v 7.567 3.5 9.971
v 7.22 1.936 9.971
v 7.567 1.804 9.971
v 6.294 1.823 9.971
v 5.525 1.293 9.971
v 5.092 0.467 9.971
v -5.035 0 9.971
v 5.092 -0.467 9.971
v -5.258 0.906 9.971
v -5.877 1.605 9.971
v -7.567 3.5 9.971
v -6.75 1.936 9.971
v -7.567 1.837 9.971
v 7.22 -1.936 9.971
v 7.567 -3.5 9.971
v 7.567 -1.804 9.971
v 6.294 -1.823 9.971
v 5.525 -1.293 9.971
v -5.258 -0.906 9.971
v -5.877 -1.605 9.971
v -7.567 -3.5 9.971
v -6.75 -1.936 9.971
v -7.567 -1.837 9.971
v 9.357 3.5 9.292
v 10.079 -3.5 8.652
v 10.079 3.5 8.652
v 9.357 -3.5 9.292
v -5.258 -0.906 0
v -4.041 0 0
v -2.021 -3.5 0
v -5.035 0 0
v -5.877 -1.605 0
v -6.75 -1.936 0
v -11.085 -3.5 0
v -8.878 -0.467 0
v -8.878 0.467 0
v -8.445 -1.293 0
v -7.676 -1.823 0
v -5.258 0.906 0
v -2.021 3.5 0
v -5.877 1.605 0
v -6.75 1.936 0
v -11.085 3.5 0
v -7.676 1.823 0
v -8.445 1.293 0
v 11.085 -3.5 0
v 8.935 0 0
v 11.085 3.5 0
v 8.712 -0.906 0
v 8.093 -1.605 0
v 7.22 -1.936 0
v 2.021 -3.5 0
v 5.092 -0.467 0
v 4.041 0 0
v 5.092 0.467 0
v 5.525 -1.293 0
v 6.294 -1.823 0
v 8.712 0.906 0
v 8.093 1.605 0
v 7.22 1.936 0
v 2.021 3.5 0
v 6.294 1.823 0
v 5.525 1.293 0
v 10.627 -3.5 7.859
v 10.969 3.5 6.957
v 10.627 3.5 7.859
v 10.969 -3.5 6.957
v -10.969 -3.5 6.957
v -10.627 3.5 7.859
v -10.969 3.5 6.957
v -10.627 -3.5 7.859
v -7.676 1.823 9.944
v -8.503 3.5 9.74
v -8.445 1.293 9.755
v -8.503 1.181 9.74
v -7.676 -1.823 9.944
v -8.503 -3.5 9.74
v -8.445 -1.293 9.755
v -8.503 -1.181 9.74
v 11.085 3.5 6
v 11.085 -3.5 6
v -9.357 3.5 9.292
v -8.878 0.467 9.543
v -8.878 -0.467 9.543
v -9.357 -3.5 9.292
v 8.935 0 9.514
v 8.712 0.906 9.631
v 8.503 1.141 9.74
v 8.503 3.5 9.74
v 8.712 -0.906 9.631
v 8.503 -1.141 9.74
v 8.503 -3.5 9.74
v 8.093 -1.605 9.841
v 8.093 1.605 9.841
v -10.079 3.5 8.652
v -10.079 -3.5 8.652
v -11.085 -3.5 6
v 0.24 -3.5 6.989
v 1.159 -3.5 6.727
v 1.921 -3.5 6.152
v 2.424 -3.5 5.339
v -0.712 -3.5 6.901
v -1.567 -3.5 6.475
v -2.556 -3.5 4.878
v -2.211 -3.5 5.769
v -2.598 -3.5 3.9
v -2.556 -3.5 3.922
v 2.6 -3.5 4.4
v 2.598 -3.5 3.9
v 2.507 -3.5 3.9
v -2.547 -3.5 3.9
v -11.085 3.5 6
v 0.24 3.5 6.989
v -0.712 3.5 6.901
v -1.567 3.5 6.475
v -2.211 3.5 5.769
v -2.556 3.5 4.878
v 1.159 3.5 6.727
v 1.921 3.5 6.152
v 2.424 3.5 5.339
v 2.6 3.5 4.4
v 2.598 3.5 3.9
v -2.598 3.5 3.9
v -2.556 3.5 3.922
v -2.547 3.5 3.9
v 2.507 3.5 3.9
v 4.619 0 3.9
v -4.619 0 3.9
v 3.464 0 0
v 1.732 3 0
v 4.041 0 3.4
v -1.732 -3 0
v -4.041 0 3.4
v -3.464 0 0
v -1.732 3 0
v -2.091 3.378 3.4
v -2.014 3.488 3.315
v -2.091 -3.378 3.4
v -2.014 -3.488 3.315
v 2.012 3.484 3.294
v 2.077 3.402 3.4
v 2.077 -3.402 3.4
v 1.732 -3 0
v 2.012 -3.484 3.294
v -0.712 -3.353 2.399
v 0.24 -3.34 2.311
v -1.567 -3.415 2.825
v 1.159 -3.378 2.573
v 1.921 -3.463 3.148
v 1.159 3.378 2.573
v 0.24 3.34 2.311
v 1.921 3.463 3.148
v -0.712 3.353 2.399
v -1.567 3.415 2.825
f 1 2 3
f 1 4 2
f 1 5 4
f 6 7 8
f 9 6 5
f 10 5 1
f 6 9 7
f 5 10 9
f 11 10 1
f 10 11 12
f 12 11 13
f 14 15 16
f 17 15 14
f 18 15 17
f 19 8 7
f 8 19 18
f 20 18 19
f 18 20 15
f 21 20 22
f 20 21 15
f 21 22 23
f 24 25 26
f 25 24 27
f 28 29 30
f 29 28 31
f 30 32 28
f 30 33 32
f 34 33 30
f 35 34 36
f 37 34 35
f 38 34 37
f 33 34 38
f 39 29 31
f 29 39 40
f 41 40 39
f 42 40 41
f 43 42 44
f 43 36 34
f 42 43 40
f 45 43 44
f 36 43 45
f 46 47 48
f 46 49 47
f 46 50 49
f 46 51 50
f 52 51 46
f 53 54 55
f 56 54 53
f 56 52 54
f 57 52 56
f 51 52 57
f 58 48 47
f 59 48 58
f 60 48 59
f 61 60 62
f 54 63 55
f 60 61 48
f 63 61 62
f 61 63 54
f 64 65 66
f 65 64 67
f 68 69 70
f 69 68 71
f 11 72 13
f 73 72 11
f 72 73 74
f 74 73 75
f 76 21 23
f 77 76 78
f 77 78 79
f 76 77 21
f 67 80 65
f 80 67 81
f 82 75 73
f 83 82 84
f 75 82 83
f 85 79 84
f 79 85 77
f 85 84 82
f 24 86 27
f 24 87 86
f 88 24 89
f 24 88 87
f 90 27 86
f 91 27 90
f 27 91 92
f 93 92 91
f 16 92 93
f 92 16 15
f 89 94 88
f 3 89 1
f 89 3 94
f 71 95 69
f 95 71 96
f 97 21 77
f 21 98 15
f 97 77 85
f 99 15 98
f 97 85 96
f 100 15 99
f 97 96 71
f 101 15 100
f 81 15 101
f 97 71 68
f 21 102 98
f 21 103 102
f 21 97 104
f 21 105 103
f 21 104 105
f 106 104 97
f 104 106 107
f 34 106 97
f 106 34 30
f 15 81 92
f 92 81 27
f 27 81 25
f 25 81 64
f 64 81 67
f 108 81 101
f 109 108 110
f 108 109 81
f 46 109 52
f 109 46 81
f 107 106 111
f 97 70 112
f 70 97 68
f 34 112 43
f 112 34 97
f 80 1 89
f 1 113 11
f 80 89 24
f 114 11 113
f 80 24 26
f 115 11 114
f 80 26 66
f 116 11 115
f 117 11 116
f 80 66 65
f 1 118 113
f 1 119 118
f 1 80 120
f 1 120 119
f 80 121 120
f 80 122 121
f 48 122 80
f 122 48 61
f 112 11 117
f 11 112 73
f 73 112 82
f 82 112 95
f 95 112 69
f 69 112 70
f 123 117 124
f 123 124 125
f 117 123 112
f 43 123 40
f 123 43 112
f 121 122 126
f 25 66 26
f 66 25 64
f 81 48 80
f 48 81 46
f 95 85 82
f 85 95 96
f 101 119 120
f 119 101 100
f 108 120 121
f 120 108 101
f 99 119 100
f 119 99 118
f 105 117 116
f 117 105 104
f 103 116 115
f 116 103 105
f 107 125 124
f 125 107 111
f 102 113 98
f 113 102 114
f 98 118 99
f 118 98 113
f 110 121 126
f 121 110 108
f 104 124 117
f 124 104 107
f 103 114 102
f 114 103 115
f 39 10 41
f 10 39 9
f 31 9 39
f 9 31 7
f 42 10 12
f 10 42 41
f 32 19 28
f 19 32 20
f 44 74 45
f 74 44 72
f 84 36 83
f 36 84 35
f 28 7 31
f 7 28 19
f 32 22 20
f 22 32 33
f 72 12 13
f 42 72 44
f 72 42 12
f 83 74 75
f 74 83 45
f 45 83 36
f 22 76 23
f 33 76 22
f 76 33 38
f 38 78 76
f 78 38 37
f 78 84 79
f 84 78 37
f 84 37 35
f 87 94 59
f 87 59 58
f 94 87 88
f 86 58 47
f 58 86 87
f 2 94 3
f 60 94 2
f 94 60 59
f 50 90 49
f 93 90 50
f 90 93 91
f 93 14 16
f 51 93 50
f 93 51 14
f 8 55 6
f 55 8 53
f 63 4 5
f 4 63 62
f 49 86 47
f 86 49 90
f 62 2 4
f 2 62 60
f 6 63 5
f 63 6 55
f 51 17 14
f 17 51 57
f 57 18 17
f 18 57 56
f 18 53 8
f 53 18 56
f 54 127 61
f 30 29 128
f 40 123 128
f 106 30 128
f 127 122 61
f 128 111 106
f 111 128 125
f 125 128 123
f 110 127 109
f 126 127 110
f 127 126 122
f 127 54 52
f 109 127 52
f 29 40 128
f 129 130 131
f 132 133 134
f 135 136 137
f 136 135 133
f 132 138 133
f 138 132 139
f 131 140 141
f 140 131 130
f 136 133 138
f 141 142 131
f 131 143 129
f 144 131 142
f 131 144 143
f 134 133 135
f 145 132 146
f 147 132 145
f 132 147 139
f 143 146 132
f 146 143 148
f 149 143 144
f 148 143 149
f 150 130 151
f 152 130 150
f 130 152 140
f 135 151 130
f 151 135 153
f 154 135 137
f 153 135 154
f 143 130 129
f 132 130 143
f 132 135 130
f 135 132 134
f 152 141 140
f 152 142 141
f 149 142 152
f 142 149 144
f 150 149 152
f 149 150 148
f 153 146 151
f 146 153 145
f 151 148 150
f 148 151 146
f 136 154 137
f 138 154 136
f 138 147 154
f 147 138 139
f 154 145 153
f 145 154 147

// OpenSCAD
stayR = 5.2/2;
thick = 7;
holeSpacing = 0.55 * 25.4;
hOffset = holeSpacing/2 + 1.5;
height = 10;
radius = height * 0.4;
stayZ = height - stayR - 3;
big = 100;
$fs = 1;
module mainBody() {
    difference() {
        rotate([90,0,0])
        difference() {
            hull() {
                for (ii=[-1:2:1]) {
                    translate([
                        ii * (stayR + hOffset - radius),
                        height - radius,
                        0
                    ]) cylinder(r=radius, h=thick, center=true);
                }
                translate([0,1,0]) cube([2*(stayR+hOffset), 2, thick], center=true);
            }
            translate([0, stayZ, 0]) cylinder(r=stayR, h=big, center=true);
        }

        for (ii=[-1:2:1]) {
            translate([ii * (holeSpacing/2),0,-0.1]) cylinder(d=3.9, h=10.1, center=false);
        }

        insert(1);

        *hull() {
            cylinder(d=thick/cos(180/6), h=1, center=false, $fn=6);
            translate([0,0,stayZ - 1])
                scale([(thick + 0.5)/thick, 1, 1])
                    cylinder(d=thick/cos(180/6), h=0.5, center=false, $fn=6);
        }

    }
}

module insert(enlarge = 0) {
    offset = 0.5;
    difference() {
        cylinder(d1=(thick-1 + enlarge)/cos(180/6), d2=(thick+enlarge)/cos(180/6), h=stayZ - 1 + enlarge/2, center=false, $fn=6);
        translate([0,0,stayZ + offset]) rotate([90,0,0]) cylinder(r=stayR, h=big, center=true);


    }
}
mainBody();
insert();
